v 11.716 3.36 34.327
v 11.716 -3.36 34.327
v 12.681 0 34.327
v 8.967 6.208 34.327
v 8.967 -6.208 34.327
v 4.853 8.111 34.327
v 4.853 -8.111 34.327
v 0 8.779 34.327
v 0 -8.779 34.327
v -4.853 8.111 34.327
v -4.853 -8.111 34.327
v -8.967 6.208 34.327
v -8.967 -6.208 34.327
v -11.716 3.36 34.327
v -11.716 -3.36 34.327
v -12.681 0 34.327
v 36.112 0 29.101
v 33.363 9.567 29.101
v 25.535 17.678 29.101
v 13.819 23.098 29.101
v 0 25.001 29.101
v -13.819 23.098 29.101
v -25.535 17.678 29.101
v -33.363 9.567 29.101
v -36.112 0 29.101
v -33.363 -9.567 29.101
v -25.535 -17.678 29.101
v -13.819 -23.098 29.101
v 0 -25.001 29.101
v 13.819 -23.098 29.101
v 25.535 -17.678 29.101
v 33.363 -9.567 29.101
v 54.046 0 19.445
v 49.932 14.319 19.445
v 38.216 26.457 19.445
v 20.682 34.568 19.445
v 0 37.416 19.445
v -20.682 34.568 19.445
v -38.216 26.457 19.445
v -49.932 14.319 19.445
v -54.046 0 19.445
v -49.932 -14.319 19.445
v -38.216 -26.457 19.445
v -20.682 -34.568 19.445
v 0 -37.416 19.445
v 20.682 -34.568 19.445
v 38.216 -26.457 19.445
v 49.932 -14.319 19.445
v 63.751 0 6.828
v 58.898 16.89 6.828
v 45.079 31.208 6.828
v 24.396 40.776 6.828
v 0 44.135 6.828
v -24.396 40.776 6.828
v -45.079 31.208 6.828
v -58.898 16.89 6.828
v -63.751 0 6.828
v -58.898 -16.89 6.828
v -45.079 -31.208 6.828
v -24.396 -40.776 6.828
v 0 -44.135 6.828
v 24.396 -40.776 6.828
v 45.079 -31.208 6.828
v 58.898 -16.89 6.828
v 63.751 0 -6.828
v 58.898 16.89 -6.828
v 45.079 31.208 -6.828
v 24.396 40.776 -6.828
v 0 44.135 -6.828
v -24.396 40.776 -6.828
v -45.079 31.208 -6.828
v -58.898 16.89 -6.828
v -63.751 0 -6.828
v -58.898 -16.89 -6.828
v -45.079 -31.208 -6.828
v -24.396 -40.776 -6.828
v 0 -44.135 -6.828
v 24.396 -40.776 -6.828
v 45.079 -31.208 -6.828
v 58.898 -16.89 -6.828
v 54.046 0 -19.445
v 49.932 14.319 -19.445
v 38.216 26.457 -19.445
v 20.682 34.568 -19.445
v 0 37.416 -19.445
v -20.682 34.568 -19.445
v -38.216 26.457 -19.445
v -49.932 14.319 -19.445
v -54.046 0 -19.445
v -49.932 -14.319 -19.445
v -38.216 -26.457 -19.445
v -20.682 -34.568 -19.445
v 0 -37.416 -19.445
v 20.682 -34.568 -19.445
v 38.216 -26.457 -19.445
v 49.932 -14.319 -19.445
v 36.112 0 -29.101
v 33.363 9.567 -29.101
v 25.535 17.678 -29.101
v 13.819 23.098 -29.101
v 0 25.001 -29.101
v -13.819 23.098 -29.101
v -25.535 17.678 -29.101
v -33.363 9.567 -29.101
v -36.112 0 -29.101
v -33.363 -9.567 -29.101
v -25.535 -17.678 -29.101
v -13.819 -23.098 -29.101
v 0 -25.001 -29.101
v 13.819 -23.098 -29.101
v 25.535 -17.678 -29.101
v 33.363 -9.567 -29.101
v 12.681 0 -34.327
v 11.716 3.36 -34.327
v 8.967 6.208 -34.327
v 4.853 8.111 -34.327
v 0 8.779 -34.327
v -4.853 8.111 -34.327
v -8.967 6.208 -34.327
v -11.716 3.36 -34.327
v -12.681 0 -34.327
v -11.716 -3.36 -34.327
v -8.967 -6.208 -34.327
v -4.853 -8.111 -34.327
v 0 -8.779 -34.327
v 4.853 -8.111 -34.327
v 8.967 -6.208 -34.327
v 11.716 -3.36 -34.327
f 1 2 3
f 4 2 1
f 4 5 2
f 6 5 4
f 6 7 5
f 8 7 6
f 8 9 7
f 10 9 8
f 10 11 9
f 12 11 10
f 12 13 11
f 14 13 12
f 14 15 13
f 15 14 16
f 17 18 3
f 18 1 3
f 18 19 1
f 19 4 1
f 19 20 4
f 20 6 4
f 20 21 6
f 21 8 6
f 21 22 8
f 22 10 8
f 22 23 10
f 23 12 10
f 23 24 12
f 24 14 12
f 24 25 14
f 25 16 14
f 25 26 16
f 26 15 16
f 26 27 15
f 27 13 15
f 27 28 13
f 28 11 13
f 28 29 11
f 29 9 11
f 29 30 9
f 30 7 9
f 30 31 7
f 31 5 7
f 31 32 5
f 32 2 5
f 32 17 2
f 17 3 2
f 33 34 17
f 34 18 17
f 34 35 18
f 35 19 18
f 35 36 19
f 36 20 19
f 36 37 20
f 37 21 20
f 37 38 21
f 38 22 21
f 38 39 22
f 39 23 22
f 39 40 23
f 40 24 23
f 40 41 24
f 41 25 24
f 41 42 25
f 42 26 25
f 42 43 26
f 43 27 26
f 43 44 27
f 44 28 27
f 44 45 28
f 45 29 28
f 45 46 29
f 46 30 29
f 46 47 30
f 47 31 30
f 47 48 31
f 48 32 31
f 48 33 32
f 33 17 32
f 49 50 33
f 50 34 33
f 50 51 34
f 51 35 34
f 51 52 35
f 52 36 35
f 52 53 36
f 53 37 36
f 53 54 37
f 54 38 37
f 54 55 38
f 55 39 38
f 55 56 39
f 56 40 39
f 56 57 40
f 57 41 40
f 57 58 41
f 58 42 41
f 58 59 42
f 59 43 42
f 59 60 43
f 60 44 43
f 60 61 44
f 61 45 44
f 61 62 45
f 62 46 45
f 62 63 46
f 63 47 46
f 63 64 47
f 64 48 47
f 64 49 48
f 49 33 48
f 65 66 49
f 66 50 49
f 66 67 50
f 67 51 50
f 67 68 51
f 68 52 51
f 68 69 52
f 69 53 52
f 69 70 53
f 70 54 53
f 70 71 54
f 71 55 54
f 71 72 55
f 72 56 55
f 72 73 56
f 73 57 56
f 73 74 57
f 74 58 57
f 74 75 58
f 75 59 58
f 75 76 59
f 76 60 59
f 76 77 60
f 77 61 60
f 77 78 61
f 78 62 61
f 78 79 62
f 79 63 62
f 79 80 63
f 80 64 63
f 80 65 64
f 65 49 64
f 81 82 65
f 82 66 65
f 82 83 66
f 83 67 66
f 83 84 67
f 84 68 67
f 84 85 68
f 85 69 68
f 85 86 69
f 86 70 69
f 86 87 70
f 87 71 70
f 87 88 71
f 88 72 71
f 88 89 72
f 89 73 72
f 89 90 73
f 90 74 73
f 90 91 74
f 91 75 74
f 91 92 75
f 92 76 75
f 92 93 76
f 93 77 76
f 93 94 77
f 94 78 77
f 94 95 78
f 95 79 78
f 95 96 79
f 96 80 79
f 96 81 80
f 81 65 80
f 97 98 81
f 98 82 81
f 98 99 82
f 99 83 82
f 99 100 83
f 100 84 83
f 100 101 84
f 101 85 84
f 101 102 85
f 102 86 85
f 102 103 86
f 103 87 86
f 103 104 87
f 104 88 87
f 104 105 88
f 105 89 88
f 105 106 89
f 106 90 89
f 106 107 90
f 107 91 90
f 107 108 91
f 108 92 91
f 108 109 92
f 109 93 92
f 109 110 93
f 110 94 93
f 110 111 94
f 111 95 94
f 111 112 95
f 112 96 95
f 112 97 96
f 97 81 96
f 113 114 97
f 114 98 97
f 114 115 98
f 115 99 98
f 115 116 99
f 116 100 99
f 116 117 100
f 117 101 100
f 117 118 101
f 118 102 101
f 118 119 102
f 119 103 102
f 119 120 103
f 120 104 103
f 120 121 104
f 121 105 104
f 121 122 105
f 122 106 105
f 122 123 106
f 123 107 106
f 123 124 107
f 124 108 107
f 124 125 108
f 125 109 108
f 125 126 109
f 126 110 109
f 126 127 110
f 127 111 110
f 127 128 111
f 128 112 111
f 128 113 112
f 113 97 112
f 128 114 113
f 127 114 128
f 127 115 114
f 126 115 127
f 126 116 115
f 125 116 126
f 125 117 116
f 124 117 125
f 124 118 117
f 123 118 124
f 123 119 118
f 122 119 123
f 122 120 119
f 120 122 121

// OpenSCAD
// Generated by SolidPython 1.0.1 on 2020-07-29 00:46:50


scale(v = [13, 9, 7]) {
	sphere(r = 5);
}
/***********************************************
*********      SolidPython code:      **********
************************************************
 
# import packages: SolidPython
from solid import *
from solid.utils import *
from itertools import chain, combinations, permutations


class Resize:

    def __init__(self, scad_file):
        self.scad_file = scad_file
        #self.scad_file = import_scad(scad_file)
        # cone/cylinder param:
        self.r1 = 0
        self.r2 = 0
        self.h = 0
        # rectangular prism param:
        self.w = 0
        self.l = 0
        # ellipse param:
        self.r = 0

    # import OpenScad code (file name corresponds to shape)


    # classify shape + parameters
    def assign(self, param1, param2, param3):
        if self.scad_file == 'cone.scad':
            self.r1 = param1
            self.r2 = param2
            self.h = param3
        elif self.scad_file == 'cylinder.scad':
            self.r1 = param1
            self.r2 = param2
            self.h = param3
        elif self.scad_file == 'rectangularPrism.scad':
            self.h = param1
            self.l = param2
            self.w = param3
        else:
            self.r = param1
            self.h = param2

    # resize parameters
    def iterate(self):
        x = range(3, 20, 2)
        i = 1
        if self.scad_file == 'cone.scad':
            tempList = list(permutations(x, 2))
            for temp in tempList:
                param1 = temp[0]
                param2 = temp[1]
                filepath = 'produced_scad_files/' + 'cone' + str(param1) + '_' + str(param2) + '_' + '.scad'
                scad_render_to_file(cylinder(h=param1, r1=param2, r2=0), filepath)

        elif self.scad_file == 'cylinder.scad':
            tempList = list(permutations(x, 3))
            for temp in tempList:
                param1 = temp[0]
                param2 = temp[1]
                filepath = 'produced_scad_files/' + 'cylinder' + str(param1) + '_' + str(param2) + '_' + '.scad'
                scad_render_to_file(cylinder(h=param1, r1=param2, r2=param2), filepath)

        elif self.scad_file == 'rectangularPrism.scad':
            tempList = list(permutations(x, 3))
            for temp in tempList:
                param1 = temp[0]
                param2 = temp[1]
                param3 = temp[2]
                filepath = 'produced_scad_files/' + 'rectangularPrism' + str(param1) + '_' + str(param2) + '_' + str(
                    param3) + '.scad'
                scad_render_to_file(cube(size=(param1, param2, param3)), filepath)

        elif self.scad_file == 'ellipse.scad':
            tempList = list(permutations(x, 4))
            for temp in tempList:
                param1 = temp[0]
                param2 = temp[1]
                param3 = temp[2]
                param4 = temp[3]
                filepath = 'produced_scad_files/' + 'ellipse' + str(param1) + '_' + str(param2) + '_' + str(param3) + '_' + str(param4) + '.scad'
                scad_render_to_file(scale([param1, param2, param3])(sphere(r=param4)), filepath)

    def render_to_scadfile(self):
        scad_render_to_file(scad, 'example.scad') 
 
************************************************/
